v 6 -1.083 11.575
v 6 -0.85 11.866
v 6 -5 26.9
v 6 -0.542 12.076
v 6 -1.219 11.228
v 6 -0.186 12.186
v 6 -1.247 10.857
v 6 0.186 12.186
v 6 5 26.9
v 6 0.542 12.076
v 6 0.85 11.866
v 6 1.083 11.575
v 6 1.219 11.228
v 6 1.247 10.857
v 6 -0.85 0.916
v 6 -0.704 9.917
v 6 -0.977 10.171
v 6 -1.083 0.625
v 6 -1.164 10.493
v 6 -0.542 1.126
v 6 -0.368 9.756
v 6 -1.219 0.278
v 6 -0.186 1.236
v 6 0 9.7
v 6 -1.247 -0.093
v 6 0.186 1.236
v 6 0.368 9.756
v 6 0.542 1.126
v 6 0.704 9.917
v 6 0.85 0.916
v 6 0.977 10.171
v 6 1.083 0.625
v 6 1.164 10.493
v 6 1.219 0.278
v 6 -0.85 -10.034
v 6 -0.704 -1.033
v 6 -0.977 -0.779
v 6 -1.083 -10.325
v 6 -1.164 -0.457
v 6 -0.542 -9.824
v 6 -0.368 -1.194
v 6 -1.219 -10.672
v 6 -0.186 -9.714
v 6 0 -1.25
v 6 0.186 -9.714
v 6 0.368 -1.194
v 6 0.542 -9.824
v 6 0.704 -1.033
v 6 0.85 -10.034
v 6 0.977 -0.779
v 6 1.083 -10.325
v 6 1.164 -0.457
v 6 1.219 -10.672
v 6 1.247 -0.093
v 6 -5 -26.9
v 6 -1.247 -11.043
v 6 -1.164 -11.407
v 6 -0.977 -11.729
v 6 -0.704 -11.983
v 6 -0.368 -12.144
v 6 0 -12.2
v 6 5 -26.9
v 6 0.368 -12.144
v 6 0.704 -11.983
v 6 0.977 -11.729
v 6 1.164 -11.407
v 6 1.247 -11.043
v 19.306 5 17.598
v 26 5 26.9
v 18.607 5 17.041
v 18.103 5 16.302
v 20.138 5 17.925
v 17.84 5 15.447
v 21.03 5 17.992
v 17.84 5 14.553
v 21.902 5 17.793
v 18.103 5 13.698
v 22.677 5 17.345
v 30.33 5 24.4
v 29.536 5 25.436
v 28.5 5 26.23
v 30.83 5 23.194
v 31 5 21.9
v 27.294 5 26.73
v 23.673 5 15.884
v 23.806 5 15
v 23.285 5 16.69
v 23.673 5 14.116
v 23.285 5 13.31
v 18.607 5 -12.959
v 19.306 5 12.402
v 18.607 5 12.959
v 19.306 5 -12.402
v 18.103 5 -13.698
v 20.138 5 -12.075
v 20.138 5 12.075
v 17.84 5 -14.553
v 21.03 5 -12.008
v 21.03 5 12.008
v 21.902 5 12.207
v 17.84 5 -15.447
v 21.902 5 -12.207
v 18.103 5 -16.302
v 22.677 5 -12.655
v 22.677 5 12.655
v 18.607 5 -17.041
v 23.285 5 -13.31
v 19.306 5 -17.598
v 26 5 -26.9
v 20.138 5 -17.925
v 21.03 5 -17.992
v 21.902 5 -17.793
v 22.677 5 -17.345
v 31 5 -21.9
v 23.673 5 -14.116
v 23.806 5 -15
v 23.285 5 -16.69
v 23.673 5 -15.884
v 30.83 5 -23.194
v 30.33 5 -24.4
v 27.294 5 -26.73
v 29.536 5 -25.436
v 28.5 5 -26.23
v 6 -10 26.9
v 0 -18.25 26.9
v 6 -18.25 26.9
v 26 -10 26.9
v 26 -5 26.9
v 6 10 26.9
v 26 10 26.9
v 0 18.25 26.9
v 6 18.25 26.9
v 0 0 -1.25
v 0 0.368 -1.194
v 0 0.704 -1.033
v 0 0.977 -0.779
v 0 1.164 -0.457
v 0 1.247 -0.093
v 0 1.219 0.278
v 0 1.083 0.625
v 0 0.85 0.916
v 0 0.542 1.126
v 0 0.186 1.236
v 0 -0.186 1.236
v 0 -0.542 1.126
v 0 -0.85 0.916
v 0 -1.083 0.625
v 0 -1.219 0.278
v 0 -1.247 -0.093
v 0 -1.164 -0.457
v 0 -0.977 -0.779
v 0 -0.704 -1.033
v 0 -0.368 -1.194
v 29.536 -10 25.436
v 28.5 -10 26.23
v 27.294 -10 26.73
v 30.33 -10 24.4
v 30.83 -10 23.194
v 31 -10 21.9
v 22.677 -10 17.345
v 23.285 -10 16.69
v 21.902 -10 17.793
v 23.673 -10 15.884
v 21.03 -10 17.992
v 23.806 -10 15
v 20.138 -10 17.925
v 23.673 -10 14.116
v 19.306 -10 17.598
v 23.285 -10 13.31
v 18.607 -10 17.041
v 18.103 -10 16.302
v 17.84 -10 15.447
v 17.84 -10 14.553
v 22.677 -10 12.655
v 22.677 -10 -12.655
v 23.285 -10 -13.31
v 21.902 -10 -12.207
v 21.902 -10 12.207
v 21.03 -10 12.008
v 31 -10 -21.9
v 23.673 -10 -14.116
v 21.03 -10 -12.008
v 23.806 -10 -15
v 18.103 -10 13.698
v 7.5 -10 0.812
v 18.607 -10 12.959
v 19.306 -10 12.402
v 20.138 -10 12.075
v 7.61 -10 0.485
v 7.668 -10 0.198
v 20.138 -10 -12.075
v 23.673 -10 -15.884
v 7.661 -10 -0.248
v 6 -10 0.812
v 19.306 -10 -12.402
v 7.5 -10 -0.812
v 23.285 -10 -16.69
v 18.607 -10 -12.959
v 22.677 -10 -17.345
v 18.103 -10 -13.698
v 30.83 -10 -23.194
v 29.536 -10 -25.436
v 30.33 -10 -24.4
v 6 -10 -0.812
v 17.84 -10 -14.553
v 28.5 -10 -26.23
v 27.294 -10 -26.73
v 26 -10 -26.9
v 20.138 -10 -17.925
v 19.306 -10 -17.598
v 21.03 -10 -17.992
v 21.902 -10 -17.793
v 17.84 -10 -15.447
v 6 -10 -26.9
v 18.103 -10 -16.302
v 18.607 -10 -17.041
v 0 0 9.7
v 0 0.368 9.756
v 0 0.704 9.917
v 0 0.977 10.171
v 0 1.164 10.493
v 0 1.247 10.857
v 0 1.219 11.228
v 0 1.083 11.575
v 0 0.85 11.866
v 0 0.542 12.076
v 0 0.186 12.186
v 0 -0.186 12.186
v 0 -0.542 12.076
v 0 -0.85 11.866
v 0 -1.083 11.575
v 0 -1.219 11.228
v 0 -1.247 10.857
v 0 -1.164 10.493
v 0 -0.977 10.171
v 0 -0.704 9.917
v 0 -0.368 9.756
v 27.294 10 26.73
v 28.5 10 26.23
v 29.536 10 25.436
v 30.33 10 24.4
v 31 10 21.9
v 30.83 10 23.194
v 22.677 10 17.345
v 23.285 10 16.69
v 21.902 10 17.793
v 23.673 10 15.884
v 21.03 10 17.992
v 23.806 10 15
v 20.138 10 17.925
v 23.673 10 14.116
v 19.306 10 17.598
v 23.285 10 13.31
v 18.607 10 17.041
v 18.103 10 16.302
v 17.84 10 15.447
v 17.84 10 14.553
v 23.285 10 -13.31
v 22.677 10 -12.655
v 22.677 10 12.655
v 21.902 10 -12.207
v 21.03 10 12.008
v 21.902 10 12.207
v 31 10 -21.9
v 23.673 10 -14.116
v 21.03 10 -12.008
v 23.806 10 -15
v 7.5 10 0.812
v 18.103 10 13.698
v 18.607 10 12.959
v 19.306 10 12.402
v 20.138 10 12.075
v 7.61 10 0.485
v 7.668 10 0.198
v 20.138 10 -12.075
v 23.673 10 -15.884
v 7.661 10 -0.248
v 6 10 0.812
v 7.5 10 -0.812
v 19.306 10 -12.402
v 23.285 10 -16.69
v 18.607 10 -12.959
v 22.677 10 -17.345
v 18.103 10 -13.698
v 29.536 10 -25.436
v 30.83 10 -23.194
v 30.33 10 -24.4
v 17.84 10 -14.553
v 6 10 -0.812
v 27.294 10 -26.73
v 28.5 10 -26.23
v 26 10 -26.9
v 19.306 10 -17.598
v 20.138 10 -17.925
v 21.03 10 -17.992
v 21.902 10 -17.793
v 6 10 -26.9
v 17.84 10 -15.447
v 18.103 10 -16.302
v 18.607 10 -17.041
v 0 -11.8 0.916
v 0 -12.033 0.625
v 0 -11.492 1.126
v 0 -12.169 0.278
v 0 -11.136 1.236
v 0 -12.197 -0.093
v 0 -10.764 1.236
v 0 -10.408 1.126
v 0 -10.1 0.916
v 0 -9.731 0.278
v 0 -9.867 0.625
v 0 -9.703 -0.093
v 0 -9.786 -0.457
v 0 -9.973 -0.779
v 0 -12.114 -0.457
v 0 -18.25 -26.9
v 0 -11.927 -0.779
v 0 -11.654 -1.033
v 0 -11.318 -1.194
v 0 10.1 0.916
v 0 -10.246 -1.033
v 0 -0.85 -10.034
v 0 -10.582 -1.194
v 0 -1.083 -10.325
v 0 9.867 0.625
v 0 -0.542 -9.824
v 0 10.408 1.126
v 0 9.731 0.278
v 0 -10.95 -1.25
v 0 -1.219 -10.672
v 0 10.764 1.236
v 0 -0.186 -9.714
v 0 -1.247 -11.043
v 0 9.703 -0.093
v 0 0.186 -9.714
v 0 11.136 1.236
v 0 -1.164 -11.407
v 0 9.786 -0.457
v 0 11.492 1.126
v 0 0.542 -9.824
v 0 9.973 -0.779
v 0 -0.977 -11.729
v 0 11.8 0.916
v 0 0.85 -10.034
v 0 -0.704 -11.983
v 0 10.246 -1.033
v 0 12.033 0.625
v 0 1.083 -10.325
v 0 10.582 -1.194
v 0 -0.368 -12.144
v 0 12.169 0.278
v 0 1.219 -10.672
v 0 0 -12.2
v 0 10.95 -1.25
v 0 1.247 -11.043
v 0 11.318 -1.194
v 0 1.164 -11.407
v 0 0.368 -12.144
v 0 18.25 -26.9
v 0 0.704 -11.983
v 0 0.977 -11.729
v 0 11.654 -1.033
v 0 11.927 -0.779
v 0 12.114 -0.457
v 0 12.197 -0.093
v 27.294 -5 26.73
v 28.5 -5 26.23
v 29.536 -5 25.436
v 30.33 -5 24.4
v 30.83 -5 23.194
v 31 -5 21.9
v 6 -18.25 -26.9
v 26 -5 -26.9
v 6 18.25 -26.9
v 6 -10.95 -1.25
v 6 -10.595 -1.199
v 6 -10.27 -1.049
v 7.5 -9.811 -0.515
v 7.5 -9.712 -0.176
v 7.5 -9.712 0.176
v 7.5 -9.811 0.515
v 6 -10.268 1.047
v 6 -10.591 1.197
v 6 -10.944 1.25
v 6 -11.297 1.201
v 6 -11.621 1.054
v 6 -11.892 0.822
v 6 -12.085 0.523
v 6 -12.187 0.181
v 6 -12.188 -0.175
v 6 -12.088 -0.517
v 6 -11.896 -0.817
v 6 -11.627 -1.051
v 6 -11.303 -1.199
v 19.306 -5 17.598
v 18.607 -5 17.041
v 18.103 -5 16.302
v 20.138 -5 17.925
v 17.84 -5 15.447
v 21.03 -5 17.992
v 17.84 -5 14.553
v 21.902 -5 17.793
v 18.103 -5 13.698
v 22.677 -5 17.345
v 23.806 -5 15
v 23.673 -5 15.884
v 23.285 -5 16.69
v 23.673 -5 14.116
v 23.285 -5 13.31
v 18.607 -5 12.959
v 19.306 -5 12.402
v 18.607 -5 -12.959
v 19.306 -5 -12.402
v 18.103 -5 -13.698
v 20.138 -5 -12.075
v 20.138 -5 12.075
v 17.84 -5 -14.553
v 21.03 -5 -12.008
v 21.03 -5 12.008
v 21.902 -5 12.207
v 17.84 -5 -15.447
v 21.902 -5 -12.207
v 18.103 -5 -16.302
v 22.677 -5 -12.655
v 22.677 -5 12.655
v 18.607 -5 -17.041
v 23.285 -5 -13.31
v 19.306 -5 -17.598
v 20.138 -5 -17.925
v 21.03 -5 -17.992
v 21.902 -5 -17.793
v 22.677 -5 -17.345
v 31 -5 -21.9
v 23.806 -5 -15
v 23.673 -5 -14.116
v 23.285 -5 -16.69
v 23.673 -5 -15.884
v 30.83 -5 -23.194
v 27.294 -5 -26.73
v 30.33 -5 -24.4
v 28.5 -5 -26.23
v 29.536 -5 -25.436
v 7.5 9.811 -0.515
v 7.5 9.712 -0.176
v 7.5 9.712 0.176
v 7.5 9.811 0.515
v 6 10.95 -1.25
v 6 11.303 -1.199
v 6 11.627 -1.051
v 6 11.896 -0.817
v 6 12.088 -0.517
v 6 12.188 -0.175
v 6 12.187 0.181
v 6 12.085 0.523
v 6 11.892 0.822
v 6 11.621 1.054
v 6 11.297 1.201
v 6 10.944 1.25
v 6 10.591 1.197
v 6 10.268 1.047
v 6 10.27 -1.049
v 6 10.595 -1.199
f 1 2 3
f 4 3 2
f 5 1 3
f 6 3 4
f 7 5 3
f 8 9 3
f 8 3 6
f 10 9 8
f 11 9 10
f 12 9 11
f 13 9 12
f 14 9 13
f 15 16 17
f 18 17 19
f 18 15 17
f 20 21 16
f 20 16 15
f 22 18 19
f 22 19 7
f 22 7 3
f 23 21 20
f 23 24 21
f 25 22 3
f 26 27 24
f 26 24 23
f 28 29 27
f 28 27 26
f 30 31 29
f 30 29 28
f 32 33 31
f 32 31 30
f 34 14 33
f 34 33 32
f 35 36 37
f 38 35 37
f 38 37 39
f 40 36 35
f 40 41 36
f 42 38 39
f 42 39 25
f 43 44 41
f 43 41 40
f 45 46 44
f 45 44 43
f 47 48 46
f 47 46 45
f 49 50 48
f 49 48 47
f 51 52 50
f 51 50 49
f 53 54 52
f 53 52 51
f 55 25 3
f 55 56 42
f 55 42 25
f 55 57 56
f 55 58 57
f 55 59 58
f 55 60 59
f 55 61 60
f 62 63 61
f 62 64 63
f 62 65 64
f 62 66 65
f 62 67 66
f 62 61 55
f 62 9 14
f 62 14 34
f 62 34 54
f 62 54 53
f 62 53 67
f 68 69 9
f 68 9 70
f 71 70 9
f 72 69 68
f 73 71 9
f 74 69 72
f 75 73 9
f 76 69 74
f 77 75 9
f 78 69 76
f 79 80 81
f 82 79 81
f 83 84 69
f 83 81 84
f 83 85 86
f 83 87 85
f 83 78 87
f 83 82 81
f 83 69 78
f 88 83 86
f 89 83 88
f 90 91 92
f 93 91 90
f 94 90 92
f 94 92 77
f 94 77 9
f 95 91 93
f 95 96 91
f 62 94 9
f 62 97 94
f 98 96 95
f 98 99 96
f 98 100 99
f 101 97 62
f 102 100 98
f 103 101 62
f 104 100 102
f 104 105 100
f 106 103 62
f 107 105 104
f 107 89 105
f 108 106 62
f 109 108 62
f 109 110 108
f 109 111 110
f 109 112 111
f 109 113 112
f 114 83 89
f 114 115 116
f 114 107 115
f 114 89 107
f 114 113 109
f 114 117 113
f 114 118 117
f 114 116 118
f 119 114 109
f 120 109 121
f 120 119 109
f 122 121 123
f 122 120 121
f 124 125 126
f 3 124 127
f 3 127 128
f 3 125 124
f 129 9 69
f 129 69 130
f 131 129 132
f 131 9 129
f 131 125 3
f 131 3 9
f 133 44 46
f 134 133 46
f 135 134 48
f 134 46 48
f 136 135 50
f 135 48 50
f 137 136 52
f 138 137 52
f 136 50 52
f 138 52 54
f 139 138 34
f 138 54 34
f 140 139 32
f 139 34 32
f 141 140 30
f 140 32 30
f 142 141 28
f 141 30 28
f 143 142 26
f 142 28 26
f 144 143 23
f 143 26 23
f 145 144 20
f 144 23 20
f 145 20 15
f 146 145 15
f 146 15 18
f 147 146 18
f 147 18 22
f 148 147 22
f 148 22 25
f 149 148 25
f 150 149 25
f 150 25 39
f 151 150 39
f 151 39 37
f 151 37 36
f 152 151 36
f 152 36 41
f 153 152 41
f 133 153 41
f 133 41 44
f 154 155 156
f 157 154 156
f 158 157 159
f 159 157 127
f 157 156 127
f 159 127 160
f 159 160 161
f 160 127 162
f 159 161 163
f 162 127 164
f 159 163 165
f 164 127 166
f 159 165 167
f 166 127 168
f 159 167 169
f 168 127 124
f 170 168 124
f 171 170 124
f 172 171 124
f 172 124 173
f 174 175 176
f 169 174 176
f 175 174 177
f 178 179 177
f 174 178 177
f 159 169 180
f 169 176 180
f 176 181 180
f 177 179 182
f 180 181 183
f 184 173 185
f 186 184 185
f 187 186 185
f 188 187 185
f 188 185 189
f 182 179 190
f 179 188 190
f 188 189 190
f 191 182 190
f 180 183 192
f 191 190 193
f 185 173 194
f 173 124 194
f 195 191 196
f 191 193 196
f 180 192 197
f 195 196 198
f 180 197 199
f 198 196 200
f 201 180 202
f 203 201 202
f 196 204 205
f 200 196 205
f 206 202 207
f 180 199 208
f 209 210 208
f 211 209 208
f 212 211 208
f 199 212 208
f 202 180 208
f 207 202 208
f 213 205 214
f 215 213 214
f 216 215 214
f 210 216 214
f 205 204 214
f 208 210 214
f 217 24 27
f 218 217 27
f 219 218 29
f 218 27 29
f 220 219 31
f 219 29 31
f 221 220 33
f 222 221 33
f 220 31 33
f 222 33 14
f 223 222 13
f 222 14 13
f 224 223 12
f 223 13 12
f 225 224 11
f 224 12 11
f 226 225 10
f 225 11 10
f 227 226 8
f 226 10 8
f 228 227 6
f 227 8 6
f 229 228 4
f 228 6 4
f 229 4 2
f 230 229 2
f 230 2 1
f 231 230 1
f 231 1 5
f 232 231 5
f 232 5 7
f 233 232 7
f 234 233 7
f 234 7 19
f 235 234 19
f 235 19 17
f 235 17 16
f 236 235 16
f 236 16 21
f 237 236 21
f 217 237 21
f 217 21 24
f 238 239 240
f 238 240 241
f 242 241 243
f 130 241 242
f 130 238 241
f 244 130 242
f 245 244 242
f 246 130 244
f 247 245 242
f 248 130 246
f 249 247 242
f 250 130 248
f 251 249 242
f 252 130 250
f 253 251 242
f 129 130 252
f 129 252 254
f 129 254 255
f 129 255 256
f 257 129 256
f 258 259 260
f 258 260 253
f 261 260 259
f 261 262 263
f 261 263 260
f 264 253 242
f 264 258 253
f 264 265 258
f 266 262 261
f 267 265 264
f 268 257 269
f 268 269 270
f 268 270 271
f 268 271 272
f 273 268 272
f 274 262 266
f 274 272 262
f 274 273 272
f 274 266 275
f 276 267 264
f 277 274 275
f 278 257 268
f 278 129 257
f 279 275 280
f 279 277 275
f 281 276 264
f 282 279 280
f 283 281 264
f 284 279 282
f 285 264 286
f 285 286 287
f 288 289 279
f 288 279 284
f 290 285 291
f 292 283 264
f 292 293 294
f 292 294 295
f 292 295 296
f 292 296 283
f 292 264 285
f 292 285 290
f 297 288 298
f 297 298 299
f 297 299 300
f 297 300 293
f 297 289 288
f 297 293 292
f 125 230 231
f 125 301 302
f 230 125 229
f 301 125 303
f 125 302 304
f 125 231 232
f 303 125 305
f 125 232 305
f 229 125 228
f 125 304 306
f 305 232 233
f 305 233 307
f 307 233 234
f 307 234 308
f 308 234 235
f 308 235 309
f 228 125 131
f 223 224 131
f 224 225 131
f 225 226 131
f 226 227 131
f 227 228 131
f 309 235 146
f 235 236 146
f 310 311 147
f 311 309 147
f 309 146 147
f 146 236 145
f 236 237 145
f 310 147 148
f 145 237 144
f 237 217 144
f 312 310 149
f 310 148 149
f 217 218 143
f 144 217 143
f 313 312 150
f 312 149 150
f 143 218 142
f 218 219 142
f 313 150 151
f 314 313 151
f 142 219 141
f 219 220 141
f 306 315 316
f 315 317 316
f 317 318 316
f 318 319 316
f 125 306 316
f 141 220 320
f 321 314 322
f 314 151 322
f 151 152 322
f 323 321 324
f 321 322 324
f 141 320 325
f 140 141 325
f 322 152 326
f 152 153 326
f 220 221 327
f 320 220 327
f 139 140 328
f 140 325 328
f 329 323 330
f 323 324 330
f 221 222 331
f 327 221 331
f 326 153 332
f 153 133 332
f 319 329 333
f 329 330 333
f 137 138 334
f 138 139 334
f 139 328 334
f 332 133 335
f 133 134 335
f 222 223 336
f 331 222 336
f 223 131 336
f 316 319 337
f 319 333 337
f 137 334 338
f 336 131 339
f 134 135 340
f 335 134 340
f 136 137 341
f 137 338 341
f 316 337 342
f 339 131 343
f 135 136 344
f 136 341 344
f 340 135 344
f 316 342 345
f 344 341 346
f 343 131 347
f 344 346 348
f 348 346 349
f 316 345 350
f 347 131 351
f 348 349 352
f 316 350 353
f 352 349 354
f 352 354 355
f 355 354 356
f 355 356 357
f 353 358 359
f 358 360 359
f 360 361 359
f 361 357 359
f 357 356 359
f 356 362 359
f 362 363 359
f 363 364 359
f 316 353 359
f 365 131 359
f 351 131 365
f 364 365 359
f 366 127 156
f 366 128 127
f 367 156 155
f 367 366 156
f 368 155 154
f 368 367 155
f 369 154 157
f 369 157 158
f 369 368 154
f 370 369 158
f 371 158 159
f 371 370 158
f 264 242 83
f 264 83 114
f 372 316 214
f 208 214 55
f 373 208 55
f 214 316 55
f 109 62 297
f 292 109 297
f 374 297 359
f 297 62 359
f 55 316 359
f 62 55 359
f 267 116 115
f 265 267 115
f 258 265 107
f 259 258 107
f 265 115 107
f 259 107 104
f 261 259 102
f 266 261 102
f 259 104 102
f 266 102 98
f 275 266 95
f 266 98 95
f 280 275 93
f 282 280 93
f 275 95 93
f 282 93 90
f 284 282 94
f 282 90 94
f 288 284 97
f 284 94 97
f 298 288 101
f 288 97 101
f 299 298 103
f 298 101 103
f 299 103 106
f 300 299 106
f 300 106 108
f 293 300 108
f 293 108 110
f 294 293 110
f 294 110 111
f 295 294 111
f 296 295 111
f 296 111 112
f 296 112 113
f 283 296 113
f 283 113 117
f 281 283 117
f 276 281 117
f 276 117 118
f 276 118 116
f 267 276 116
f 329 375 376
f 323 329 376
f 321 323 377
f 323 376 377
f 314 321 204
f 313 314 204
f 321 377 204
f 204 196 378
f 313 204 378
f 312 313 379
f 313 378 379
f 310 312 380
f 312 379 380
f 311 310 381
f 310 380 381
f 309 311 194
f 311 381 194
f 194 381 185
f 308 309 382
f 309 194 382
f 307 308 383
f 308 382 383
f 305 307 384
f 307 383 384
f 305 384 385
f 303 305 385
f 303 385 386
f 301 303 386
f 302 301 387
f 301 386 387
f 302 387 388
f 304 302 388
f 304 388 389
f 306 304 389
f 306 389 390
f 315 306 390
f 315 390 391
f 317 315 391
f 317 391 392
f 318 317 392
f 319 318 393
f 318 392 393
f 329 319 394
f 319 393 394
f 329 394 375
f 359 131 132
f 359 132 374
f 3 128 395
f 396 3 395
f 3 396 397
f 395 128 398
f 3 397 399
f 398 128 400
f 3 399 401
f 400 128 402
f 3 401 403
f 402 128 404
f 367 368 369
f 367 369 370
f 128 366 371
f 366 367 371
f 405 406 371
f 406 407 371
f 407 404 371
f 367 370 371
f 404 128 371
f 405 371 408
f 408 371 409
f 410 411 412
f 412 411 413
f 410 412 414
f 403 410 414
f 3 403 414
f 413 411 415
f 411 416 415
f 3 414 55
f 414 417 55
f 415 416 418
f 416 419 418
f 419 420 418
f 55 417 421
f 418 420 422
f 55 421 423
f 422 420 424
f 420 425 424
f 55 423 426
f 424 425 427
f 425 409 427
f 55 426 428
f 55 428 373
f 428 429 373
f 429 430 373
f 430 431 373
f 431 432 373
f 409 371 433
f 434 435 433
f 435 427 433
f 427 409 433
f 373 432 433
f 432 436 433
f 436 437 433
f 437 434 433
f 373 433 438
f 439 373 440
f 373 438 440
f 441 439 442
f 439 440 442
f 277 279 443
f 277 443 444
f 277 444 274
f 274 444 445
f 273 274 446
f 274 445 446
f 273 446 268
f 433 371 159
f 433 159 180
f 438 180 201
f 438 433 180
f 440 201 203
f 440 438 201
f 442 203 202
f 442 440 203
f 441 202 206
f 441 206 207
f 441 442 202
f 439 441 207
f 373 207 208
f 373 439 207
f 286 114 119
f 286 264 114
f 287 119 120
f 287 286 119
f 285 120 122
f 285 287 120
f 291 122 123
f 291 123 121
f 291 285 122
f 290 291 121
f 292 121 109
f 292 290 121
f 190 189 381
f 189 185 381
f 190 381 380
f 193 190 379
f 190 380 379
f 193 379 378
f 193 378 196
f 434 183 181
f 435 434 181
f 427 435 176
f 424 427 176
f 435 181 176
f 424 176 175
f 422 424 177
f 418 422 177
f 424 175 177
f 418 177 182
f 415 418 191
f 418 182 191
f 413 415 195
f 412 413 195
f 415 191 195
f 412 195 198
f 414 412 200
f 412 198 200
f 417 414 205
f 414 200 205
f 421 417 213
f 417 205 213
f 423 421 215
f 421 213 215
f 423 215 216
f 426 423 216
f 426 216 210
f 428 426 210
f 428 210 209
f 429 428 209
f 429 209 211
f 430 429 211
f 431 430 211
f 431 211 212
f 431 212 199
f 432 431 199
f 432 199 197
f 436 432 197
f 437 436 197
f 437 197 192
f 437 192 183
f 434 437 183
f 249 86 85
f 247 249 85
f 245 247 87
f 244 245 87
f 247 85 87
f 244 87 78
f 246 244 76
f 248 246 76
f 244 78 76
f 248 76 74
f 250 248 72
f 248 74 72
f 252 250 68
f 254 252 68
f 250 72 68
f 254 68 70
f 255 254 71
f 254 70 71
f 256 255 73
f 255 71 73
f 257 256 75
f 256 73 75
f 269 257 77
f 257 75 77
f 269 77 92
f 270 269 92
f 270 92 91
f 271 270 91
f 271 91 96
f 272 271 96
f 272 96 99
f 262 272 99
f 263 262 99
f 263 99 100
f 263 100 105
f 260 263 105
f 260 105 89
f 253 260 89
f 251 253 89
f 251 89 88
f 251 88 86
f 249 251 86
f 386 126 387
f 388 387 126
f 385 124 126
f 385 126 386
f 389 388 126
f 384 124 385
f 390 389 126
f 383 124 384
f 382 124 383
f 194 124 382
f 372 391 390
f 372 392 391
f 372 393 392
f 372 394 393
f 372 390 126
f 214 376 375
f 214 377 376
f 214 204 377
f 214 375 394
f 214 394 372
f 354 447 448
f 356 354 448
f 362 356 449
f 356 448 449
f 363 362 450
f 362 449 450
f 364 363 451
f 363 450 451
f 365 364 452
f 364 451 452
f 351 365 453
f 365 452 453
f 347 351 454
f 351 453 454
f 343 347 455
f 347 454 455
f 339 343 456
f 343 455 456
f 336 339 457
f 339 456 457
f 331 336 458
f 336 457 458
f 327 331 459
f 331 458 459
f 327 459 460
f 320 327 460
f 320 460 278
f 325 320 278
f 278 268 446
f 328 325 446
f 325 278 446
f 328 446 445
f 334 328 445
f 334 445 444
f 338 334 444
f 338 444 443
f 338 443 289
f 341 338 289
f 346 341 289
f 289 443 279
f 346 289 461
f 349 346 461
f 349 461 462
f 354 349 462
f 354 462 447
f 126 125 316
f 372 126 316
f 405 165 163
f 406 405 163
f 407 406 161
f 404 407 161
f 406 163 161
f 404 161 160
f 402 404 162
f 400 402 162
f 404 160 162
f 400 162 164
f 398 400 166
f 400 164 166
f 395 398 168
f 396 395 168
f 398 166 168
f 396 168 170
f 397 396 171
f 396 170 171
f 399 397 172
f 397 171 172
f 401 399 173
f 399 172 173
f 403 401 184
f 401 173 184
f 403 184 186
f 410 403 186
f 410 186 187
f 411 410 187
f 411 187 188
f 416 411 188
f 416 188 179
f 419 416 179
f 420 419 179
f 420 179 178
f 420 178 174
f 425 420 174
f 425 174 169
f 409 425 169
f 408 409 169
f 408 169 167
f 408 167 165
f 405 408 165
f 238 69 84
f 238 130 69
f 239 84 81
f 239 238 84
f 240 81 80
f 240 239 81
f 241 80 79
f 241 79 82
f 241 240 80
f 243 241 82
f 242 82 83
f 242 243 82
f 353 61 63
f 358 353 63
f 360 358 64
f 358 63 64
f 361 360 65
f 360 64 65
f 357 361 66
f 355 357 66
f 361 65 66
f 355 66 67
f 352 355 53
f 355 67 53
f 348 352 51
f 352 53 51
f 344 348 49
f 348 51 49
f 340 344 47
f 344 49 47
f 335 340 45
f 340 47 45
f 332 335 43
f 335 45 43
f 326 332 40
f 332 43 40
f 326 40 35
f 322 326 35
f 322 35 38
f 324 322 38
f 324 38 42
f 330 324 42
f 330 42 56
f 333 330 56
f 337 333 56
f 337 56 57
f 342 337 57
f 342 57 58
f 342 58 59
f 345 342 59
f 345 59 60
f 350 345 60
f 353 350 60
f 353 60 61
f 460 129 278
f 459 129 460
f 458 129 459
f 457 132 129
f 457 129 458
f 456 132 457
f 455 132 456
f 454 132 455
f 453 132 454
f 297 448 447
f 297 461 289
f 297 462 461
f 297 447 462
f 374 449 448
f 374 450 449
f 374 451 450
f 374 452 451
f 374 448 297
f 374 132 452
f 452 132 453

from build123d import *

# Parameters (mm, degrees)
SKETCH_1_W             = 53.8
SKETCH_1_H             = 36.5
EXTRUDE_1_DEPTH        = 6
SKETCH_2_W             = 53.8
SKETCH_2_H             = 20
EXTRUDE_2_DEPTH        = 25
SKETCH_3_W             = 53.8
SKETCH_3_H             = 10
CUT_EXTRUDE_1_DEPTH    = 25
HOLE_WIZARD_M3_1_D     = 2.5
HOLE_WIZARD_M3_1_DEPTH = 7.5
HOLE_WIZARD_M3_1_TIP   = 0.751075774
SKETCH_6_R             = 3
CUT_EXTRUDE_2_DEPTH    = 29.25
FILLET_1_R             = 5


with BuildPart() as part:
    # 草图1 → 凸台-拉伸1 (new body)
    with BuildSketch(Plane(origin=(0, 0, 0), x_dir=(0, 0, -1), z_dir=(1, 0, 0))):
        Rectangle(SKETCH_1_W, SKETCH_1_H)
    extrude(amount=EXTRUDE_1_DEPTH)

    # 草图2 → 凸台-拉伸2 (add)
    with BuildSketch(Plane(origin=(6, 0, 0), x_dir=(0, 0, -1), z_dir=(1, 0, 0))):
        Rectangle(SKETCH_2_W, SKETCH_2_H)
    extrude(amount=EXTRUDE_2_DEPTH)

    # 草图3 → 切除-拉伸1 (cut)
    with BuildSketch(Plane(origin=(31, 0, 0), x_dir=(0, 0, -1), z_dir=(1, 0, 0))):
        Rectangle(SKETCH_3_W, SKETCH_3_H)
    extrude(amount=-CUT_EXTRUDE_1_DEPTH, mode=Mode.SUBTRACT)

    # M3 螺纹孔1
    with Locations(Plane.ZY):
        with Locations((-10.95, 0), (0, 10.95), (0, 0), (0, -10.95), (10.95, 0)):
            Hole(HOLE_WIZARD_M3_1_D / 2, depth=HOLE_WIZARD_M3_1_DEPTH)
            with Locations((0, 0, -(HOLE_WIZARD_M3_1_DEPTH + HOLE_WIZARD_M3_1_TIP / 2))):  # 118° drill point
                Cone(0, HOLE_WIZARD_M3_1_D / 2, HOLE_WIZARD_M3_1_TIP, mode=Mode.SUBTRACT)

    # 草图6 → 切除-拉伸2 (cut, through all)
    with BuildSketch(Plane.XZ.offset(10)):
        with Locations((20.806055882, 15)):
            Circle(SKETCH_6_R)
        with Locations((20.806055882, -15)):
            Circle(SKETCH_6_R)
    extrude(amount=-CUT_EXTRUDE_2_DEPTH, mode=Mode.SUBTRACT)

    # 圆角1
    fillet_1_edges = [part.edges().sort_by_distance(p)[0] for p in [
        (31, -7.5, -26.9),
        (31, 7.5, 26.9),
        (31, 7.5, -26.9),
        (31, -7.5, 26.9),
    ]]
    fillet(fillet_1_edges, radius=FILLET_1_R)


solid = part.part
